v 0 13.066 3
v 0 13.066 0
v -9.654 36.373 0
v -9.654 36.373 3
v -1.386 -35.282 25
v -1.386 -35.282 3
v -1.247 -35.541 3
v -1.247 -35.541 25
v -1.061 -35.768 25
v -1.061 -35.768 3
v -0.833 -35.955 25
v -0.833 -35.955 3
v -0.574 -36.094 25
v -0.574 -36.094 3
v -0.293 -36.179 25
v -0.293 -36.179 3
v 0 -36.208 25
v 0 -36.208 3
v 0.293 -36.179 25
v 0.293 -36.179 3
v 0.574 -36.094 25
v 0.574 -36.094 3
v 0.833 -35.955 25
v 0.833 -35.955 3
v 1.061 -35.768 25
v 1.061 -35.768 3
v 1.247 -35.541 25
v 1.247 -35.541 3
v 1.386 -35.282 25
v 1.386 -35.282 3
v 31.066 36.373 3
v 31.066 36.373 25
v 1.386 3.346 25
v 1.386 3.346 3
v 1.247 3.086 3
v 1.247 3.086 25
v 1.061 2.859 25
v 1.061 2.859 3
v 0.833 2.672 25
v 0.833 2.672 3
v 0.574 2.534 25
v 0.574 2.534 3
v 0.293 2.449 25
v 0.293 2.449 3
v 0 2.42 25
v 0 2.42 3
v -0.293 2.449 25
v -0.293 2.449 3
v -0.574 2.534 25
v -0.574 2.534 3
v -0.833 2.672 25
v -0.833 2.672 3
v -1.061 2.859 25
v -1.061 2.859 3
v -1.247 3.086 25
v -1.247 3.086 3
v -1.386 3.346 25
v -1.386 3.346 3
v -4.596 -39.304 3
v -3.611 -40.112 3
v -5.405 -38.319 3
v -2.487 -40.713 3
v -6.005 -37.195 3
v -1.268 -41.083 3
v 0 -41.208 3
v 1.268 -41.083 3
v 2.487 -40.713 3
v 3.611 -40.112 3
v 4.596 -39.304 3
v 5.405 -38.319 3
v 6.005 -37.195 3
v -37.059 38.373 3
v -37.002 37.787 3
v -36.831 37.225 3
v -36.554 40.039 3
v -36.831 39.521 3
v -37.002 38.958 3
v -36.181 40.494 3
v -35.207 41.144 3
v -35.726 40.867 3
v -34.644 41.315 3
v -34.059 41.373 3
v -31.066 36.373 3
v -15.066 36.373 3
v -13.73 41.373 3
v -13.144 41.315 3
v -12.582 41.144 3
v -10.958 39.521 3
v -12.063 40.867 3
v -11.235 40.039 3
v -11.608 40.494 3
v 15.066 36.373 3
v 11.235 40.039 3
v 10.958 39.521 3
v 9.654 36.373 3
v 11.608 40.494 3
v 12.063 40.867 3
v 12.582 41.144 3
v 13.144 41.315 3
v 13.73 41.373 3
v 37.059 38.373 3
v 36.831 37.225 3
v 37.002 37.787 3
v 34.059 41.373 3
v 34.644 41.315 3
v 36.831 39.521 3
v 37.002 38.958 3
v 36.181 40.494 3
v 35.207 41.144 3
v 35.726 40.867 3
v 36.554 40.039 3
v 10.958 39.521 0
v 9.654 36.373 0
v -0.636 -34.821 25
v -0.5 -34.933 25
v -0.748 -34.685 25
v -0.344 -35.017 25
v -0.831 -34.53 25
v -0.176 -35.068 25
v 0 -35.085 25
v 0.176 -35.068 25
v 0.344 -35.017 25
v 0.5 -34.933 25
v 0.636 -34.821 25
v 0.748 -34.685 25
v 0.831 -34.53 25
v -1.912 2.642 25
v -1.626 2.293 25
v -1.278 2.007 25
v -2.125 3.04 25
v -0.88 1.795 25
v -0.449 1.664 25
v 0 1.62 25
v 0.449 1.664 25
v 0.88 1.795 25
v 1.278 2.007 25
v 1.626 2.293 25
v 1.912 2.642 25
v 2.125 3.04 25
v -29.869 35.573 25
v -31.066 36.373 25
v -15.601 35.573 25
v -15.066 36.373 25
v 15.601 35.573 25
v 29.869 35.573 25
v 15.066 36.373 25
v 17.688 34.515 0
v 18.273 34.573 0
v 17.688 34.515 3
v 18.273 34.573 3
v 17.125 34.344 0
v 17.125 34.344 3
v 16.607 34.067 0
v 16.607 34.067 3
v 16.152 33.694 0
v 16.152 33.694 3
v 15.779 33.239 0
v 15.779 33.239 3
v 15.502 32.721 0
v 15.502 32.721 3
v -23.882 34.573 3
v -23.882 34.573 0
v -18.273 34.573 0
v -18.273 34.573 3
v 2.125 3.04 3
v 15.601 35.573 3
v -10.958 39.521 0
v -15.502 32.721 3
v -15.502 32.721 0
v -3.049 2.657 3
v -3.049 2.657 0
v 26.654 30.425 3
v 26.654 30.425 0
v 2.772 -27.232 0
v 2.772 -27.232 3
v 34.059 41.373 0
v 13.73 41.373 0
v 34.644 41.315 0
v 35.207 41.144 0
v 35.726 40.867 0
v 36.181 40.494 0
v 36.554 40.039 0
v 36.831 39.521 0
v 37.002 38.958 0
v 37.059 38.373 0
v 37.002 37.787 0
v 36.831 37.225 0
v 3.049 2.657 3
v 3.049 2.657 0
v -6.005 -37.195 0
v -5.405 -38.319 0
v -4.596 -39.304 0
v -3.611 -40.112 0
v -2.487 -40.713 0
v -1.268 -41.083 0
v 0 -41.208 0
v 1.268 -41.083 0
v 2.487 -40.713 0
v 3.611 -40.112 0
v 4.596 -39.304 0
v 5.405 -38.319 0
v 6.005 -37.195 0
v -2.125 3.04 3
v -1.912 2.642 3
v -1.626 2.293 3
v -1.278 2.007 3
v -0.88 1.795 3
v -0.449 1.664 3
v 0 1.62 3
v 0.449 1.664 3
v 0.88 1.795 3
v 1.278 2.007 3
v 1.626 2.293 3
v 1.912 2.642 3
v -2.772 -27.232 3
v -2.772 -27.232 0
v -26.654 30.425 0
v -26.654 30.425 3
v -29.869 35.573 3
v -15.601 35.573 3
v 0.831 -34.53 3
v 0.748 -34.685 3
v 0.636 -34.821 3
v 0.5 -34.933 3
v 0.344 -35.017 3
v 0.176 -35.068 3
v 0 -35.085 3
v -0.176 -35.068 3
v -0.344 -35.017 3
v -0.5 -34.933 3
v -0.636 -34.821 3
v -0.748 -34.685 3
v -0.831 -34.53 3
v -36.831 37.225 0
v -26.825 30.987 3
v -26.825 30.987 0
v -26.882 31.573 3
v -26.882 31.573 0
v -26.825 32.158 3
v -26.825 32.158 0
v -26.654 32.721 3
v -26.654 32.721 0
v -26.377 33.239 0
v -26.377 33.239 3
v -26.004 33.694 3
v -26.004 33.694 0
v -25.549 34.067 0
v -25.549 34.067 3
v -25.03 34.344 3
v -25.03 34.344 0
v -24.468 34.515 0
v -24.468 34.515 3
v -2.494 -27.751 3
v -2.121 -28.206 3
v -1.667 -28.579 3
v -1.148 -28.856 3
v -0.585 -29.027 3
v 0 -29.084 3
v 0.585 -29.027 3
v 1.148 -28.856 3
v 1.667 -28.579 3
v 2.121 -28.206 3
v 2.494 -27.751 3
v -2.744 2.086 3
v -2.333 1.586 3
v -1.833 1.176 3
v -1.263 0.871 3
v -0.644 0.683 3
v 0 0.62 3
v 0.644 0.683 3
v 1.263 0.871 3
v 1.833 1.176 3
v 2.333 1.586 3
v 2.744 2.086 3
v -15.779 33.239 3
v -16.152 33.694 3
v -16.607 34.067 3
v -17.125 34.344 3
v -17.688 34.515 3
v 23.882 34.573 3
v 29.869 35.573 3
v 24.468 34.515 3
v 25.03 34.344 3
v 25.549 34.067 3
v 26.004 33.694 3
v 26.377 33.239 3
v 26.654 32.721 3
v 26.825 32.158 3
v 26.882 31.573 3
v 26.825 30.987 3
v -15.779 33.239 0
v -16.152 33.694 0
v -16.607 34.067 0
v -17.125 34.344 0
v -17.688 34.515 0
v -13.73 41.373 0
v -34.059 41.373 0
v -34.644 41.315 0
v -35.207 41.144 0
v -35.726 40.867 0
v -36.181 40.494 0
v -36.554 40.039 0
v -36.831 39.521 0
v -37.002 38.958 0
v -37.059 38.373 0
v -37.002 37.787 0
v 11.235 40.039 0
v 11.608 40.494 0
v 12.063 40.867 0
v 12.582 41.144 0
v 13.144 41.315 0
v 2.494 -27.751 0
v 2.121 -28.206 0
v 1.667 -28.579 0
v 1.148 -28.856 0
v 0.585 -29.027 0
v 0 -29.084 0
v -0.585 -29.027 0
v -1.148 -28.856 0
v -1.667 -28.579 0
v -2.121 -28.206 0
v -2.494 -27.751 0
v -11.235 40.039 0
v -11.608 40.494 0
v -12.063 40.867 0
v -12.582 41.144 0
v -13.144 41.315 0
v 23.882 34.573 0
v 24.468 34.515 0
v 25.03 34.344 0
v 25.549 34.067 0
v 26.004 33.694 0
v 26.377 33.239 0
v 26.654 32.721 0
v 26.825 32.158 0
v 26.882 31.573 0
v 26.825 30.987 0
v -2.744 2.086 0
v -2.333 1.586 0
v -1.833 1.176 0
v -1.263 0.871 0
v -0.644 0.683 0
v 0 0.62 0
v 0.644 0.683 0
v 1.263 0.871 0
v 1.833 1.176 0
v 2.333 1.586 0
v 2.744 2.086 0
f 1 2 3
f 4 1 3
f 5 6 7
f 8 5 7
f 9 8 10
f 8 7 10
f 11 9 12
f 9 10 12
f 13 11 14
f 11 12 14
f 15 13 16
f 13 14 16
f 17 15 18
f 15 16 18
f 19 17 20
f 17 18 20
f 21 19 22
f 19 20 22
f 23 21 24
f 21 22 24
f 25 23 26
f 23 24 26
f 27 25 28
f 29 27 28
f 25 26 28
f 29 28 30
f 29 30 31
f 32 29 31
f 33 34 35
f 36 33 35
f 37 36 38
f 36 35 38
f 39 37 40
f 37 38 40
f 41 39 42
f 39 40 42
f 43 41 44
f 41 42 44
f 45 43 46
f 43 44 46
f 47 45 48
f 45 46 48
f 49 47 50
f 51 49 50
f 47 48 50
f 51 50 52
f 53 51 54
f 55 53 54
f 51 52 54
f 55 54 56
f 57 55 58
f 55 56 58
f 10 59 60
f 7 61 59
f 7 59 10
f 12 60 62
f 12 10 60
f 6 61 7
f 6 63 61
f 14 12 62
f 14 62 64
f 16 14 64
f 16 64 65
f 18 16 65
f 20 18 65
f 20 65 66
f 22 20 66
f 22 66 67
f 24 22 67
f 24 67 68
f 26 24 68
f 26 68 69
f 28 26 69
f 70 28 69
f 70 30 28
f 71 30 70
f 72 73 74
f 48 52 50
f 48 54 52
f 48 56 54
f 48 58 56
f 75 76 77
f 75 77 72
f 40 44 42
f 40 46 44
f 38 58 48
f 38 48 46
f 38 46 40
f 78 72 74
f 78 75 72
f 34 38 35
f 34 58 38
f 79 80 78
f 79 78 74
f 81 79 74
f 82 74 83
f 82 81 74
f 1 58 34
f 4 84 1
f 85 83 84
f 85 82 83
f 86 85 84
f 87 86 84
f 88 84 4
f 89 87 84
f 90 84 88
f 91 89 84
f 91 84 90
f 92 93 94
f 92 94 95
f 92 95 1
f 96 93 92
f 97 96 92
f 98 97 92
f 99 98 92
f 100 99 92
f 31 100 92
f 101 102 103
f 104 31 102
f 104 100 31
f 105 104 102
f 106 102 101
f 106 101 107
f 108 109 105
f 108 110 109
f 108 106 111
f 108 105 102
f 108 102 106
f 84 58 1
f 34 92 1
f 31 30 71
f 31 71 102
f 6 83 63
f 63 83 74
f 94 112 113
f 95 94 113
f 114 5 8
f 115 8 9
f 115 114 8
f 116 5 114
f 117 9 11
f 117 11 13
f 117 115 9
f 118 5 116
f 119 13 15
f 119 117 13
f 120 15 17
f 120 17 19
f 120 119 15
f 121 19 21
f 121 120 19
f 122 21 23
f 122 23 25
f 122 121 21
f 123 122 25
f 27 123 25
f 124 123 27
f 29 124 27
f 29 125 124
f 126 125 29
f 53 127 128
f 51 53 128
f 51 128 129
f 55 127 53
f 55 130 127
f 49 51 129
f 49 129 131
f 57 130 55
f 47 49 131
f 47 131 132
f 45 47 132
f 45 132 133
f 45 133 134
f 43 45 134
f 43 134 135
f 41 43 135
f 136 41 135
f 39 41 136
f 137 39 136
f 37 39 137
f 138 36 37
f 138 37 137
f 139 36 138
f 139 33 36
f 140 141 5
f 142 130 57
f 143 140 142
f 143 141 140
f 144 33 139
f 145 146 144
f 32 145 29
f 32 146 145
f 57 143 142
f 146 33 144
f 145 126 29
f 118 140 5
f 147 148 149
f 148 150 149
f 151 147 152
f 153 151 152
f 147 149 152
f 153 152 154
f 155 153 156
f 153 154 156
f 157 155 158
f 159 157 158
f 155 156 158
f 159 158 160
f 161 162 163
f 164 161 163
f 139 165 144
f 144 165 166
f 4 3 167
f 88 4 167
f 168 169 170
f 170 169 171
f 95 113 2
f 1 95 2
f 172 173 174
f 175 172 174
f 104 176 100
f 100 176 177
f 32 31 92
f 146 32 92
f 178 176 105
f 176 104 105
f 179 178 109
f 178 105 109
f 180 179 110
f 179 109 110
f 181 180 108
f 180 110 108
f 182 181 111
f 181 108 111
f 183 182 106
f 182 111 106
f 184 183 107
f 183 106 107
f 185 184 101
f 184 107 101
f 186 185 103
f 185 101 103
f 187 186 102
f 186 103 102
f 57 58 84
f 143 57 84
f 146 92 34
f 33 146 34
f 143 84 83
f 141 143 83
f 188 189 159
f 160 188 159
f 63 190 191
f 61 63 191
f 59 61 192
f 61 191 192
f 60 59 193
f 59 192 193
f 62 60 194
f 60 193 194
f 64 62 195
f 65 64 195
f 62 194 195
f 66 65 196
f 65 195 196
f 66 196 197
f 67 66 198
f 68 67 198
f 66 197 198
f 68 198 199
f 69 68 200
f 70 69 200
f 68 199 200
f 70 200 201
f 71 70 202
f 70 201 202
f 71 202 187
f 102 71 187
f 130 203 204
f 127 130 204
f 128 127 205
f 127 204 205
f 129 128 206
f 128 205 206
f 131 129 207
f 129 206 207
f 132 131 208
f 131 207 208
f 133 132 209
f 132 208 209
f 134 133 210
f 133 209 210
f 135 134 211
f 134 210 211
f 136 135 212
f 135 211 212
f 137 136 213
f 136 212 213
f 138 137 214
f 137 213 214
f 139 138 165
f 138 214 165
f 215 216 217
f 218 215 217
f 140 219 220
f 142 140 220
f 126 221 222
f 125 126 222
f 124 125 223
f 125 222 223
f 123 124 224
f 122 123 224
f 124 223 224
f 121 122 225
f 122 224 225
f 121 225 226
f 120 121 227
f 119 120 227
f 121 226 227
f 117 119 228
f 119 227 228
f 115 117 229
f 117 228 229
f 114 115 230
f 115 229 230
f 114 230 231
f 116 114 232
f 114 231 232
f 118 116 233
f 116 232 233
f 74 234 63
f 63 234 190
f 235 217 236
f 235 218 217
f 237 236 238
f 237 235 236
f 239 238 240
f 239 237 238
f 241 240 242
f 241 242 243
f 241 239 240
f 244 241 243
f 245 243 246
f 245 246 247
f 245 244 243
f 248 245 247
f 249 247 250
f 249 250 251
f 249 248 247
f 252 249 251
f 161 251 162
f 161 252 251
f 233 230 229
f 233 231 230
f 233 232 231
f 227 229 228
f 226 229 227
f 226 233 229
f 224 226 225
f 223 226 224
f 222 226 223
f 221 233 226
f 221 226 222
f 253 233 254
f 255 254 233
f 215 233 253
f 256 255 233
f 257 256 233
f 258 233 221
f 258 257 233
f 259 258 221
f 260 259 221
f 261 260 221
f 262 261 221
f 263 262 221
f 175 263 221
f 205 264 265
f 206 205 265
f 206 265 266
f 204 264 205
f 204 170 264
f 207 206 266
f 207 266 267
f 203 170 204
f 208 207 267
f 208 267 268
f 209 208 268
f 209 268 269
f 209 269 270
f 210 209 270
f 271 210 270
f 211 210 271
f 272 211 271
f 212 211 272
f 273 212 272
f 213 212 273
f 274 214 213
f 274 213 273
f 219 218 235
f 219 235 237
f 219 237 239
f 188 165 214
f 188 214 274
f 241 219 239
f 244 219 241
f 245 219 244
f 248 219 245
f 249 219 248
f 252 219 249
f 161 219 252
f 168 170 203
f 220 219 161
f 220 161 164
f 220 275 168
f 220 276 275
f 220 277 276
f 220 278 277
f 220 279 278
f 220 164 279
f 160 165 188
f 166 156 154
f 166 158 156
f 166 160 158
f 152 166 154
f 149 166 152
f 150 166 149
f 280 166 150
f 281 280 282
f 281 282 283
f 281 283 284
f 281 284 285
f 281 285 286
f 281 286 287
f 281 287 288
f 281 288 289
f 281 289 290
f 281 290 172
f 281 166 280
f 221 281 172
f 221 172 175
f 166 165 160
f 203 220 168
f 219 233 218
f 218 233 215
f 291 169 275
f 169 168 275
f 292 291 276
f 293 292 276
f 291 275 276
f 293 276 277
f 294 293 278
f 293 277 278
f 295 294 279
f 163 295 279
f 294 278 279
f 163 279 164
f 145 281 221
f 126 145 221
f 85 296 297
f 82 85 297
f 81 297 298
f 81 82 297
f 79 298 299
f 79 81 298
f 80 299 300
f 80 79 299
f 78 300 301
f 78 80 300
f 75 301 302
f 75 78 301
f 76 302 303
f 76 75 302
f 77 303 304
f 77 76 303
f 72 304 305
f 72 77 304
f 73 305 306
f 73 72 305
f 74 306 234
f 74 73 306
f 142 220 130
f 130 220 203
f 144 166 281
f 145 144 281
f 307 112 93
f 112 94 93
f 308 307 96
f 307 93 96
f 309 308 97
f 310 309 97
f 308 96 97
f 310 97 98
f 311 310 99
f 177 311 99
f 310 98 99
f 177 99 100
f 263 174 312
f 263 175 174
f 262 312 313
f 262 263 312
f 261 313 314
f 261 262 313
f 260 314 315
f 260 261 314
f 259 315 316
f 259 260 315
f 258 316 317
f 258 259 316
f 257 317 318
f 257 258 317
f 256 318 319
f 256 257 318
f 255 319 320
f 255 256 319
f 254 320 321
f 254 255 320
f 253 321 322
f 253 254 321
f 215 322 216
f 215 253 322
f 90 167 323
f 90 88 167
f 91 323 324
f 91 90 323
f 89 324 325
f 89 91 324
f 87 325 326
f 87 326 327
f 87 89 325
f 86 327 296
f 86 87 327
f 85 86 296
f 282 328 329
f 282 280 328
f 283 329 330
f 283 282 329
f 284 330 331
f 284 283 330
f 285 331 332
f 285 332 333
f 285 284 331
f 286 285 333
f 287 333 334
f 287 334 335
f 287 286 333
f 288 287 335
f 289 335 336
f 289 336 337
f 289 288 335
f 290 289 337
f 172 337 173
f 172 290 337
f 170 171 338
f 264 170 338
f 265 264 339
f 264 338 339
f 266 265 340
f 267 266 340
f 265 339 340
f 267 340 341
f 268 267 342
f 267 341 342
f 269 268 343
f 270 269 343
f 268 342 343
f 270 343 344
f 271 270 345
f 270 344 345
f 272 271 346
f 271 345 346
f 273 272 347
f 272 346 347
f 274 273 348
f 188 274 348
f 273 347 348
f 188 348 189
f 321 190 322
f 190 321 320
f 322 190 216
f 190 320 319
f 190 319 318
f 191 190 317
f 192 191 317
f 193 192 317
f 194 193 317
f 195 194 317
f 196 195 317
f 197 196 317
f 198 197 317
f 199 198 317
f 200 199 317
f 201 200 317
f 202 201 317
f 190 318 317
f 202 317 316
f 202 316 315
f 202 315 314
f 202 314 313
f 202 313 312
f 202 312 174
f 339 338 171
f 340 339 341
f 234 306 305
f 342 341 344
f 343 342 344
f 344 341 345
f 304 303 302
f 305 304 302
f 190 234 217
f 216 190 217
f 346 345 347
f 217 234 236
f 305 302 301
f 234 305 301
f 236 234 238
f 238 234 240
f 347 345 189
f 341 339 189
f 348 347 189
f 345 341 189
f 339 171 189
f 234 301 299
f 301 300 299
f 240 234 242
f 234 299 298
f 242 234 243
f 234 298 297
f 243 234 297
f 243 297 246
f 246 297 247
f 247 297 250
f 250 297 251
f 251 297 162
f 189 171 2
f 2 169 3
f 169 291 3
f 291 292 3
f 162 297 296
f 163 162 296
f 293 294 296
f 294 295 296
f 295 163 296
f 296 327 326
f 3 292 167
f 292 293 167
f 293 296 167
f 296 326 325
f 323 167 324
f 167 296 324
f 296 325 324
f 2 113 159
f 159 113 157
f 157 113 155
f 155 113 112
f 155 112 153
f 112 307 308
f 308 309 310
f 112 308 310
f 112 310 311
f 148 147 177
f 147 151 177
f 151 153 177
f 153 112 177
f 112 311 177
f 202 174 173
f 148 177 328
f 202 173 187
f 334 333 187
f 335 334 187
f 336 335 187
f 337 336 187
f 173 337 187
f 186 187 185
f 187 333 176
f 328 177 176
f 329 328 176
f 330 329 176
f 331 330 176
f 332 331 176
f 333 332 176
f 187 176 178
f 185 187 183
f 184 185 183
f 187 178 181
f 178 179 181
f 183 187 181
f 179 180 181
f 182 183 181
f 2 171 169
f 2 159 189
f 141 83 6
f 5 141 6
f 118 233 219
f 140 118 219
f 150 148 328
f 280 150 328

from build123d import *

# Parameters (mm, degrees)
F1_DEPTH = 3
F2_DEPTH = 25
F3_R     = 3


with BuildPart() as f1:
    # F0 (on Top) → F1 (new body)
    with BuildSketch(Plane.XY):
        with BuildLine():
            Line((-1.3858192988, 3.3456637461), (-15.066017178, 36.372583002))
            Line((-15.066017178, 36.372583002), (-31.066017178, 36.372583002))
            Line((-31.066017178, 36.372583002), (-1.3858192988, -35.2817532519))
            ThreePointArc((-1.3858192988, -35.2817532519), (0, -36.2077281033), (1.3858192988, -35.2817532519))
            Line((1.3858192988, -35.2817532519), (31.066017178, 36.372583002))
            Line((31.066017178, 36.372583002), (15.066017178, 36.372583002))
            Line((15.066017178, 36.372583002), (1.3858192988, 3.3456637461))
            ThreePointArc((1.3858192988, 3.3456637461), (0, 2.4196888946), (-1.3858192988, 3.3456637461))
        make_face()
        with BuildLine():
            ThreePointArc((0.8314915793, -34.5295180065), (0, -35.0851029174), (-0.8314915793, -34.5295180065))
            Line((-0.8314915793, -34.5295180065), (-29.8687325678, 35.572583002))
            Line((-29.8687325678, 35.572583002), (-15.6005600883, 35.572583002))
            Line((-15.6005600883, 35.572583002), (-2.1249229248, 3.0395170002))
            ThreePointArc((-2.1249229248, 3.0395170002), (0, 1.6196888946), (2.1249229248, 3.0395170002))
            Line((2.1249229248, 3.0395170002), (15.6005600883, 35.572583002))
            Line((15.6005600883, 35.572583002), (29.8687325678, 35.572583002))
            Line((29.8687325678, 35.572583002), (0.8314915793, -34.5295180065))
        make_face(mode=Mode.SUBTRACT)
        with BuildLine():
            Line((-29.8687325678, 35.572583002), (-0.8314915793, -34.5295180065))
            ThreePointArc((-0.8314915793, -34.5295180065), (0, -35.0851029174), (0.8314915793, -34.5295180065))
            Line((0.8314915793, -34.5295180065), (29.8687325678, 35.572583002))
            Line((29.8687325678, 35.572583002), (15.6005600883, 35.572583002))
            Line((15.6005600883, 35.572583002), (2.1249229248, 3.0395170002))
            ThreePointArc((2.1249229248, 3.0395170002), (0, 1.6196888946), (-2.1249229248, 3.0395170002))
            Line((-2.1249229248, 3.0395170002), (-15.6005600883, 35.572583002))
            Line((-15.6005600883, 35.572583002), (-29.8687325678, 35.572583002))
        make_face()
        with BuildLine():
            Line((28.3721268052, 34.572583002), (0, -33.9237903244))
            Line((0, -33.9237903244), (-28.3721268052, 34.572583002))
            Line((-28.3721268052, 34.572583002), (-16.2687387262, 34.572583002))
            Line((-16.2687387262, 34.572583002), (-3.0488024573, 2.6568335678))
            ThreePointArc((-3.0488024573, 2.6568335678), (0, 0.6196888946), (3.0488024573, 2.6568335678))
            Line((3.0488024573, 2.6568335678), (16.2687387262, 34.572583002))
            Line((16.2687387262, 34.572583002), (28.3721268052, 34.572583002))
        make_face(mode=Mode.SUBTRACT)
        with BuildLine():
            Line((-31.066017178, 36.372583002), (-15.066017178, 36.372583002))
            Line((-15.066017178, 36.372583002), (-9.6540561765, 36.372583002))
            Line((-9.6540561765, 36.372583002), (-11.7251239884, 41.372583002))
            Line((-11.7251239884, 41.372583002), (-38.5490459913, 41.372583002))
            Line((-38.5490459913, 41.372583002), (-6.0052169613, -37.1951704137))
            ThreePointArc((-6.0052169613, -37.1951704137), (0, -41.2077281033), (6.0052169613, -37.1951704137))
            Line((6.0052169613, -37.1951704137), (38.5490459913, 41.372583002))
            Line((38.5490459913, 41.372583002), (11.7251239884, 41.372583002))
            Line((11.7251239884, 41.372583002), (9.6540561765, 36.372583002))
            Line((9.6540561765, 36.372583002), (15.066017178, 36.372583002))
            Line((15.066017178, 36.372583002), (31.066017178, 36.372583002))
            Line((31.066017178, 36.372583002), (1.3858192988, -35.2817532519))
            ThreePointArc((1.3858192988, -35.2817532519), (0, -36.2077281033), (-1.3858192988, -35.2817532519))
            Line((-1.3858192988, -35.2817532519), (-31.066017178, 36.372583002))
        make_face()
        with BuildLine():
            Line((-9.6540561765, 36.372583002), (-15.066017178, 36.372583002))
            Line((-15.066017178, 36.372583002), (-1.3858192988, 3.3456637461))
            ThreePointArc((-1.3858192988, 3.3456637461), (0, 2.4196888946), (1.3858192988, 3.3456637461))
            Line((1.3858192988, 3.3456637461), (15.066017178, 36.372583002))
            Line((15.066017178, 36.372583002), (9.6540561765, 36.372583002))
            Line((9.6540561765, 36.372583002), (0, 13.0656296488))
            Line((0, 13.0656296488), (-9.6540561765, 36.372583002))
        make_face()
    extrude(amount=F1_DEPTH)

    # F0 (on Top) → F2 (join)
    with BuildSketch(Plane.XY):
        with BuildLine():
            Line((-1.3858192988, 3.3456637461), (-15.066017178, 36.372583002))
            Line((-15.066017178, 36.372583002), (-31.066017178, 36.372583002))
            Line((-31.066017178, 36.372583002), (-1.3858192988, -35.2817532519))
            ThreePointArc((-1.3858192988, -35.2817532519), (0, -36.2077281033), (1.3858192988, -35.2817532519))
            Line((1.3858192988, -35.2817532519), (31.066017178, 36.372583002))
            Line((31.066017178, 36.372583002), (15.066017178, 36.372583002))
            Line((15.066017178, 36.372583002), (1.3858192988, 3.3456637461))
            ThreePointArc((1.3858192988, 3.3456637461), (0, 2.4196888946), (-1.3858192988, 3.3456637461))
        make_face()
        with BuildLine():
            ThreePointArc((0.8314915793, -34.5295180065), (0, -35.0851029174), (-0.8314915793, -34.5295180065))
            Line((-0.8314915793, -34.5295180065), (-29.8687325678, 35.572583002))
            Line((-29.8687325678, 35.572583002), (-15.6005600883, 35.572583002))
            Line((-15.6005600883, 35.572583002), (-2.1249229248, 3.0395170002))
            ThreePointArc((-2.1249229248, 3.0395170002), (0, 1.6196888946), (2.1249229248, 3.0395170002))
            Line((2.1249229248, 3.0395170002), (15.6005600883, 35.572583002))
            Line((15.6005600883, 35.572583002), (29.8687325678, 35.572583002))
            Line((29.8687325678, 35.572583002), (0.8314915793, -34.5295180065))
        make_face(mode=Mode.SUBTRACT)
    extrude(amount=F2_DEPTH)

    # F3
    f3_edges = [f1.edges().sort_by_distance(p)[0] for p in [
        (-38.549046, 41.372583, 1.5),
        (-11.725124, 41.372583, 1.5),
        (11.725124, 41.372583, 1.5),
        (38.549046, 41.372583, 1.5),
        (-16.268739, 34.572583, 1.5),
        (-28.372127, 34.572583, 1.5),
        (16.268739, 34.572583, 1.5),
        (28.372127, 34.572583, 1.5),
        (0, -33.92379, 1.5),
    ]]
    fillet(f3_edges, radius=F3_R)


solid = f1.part
